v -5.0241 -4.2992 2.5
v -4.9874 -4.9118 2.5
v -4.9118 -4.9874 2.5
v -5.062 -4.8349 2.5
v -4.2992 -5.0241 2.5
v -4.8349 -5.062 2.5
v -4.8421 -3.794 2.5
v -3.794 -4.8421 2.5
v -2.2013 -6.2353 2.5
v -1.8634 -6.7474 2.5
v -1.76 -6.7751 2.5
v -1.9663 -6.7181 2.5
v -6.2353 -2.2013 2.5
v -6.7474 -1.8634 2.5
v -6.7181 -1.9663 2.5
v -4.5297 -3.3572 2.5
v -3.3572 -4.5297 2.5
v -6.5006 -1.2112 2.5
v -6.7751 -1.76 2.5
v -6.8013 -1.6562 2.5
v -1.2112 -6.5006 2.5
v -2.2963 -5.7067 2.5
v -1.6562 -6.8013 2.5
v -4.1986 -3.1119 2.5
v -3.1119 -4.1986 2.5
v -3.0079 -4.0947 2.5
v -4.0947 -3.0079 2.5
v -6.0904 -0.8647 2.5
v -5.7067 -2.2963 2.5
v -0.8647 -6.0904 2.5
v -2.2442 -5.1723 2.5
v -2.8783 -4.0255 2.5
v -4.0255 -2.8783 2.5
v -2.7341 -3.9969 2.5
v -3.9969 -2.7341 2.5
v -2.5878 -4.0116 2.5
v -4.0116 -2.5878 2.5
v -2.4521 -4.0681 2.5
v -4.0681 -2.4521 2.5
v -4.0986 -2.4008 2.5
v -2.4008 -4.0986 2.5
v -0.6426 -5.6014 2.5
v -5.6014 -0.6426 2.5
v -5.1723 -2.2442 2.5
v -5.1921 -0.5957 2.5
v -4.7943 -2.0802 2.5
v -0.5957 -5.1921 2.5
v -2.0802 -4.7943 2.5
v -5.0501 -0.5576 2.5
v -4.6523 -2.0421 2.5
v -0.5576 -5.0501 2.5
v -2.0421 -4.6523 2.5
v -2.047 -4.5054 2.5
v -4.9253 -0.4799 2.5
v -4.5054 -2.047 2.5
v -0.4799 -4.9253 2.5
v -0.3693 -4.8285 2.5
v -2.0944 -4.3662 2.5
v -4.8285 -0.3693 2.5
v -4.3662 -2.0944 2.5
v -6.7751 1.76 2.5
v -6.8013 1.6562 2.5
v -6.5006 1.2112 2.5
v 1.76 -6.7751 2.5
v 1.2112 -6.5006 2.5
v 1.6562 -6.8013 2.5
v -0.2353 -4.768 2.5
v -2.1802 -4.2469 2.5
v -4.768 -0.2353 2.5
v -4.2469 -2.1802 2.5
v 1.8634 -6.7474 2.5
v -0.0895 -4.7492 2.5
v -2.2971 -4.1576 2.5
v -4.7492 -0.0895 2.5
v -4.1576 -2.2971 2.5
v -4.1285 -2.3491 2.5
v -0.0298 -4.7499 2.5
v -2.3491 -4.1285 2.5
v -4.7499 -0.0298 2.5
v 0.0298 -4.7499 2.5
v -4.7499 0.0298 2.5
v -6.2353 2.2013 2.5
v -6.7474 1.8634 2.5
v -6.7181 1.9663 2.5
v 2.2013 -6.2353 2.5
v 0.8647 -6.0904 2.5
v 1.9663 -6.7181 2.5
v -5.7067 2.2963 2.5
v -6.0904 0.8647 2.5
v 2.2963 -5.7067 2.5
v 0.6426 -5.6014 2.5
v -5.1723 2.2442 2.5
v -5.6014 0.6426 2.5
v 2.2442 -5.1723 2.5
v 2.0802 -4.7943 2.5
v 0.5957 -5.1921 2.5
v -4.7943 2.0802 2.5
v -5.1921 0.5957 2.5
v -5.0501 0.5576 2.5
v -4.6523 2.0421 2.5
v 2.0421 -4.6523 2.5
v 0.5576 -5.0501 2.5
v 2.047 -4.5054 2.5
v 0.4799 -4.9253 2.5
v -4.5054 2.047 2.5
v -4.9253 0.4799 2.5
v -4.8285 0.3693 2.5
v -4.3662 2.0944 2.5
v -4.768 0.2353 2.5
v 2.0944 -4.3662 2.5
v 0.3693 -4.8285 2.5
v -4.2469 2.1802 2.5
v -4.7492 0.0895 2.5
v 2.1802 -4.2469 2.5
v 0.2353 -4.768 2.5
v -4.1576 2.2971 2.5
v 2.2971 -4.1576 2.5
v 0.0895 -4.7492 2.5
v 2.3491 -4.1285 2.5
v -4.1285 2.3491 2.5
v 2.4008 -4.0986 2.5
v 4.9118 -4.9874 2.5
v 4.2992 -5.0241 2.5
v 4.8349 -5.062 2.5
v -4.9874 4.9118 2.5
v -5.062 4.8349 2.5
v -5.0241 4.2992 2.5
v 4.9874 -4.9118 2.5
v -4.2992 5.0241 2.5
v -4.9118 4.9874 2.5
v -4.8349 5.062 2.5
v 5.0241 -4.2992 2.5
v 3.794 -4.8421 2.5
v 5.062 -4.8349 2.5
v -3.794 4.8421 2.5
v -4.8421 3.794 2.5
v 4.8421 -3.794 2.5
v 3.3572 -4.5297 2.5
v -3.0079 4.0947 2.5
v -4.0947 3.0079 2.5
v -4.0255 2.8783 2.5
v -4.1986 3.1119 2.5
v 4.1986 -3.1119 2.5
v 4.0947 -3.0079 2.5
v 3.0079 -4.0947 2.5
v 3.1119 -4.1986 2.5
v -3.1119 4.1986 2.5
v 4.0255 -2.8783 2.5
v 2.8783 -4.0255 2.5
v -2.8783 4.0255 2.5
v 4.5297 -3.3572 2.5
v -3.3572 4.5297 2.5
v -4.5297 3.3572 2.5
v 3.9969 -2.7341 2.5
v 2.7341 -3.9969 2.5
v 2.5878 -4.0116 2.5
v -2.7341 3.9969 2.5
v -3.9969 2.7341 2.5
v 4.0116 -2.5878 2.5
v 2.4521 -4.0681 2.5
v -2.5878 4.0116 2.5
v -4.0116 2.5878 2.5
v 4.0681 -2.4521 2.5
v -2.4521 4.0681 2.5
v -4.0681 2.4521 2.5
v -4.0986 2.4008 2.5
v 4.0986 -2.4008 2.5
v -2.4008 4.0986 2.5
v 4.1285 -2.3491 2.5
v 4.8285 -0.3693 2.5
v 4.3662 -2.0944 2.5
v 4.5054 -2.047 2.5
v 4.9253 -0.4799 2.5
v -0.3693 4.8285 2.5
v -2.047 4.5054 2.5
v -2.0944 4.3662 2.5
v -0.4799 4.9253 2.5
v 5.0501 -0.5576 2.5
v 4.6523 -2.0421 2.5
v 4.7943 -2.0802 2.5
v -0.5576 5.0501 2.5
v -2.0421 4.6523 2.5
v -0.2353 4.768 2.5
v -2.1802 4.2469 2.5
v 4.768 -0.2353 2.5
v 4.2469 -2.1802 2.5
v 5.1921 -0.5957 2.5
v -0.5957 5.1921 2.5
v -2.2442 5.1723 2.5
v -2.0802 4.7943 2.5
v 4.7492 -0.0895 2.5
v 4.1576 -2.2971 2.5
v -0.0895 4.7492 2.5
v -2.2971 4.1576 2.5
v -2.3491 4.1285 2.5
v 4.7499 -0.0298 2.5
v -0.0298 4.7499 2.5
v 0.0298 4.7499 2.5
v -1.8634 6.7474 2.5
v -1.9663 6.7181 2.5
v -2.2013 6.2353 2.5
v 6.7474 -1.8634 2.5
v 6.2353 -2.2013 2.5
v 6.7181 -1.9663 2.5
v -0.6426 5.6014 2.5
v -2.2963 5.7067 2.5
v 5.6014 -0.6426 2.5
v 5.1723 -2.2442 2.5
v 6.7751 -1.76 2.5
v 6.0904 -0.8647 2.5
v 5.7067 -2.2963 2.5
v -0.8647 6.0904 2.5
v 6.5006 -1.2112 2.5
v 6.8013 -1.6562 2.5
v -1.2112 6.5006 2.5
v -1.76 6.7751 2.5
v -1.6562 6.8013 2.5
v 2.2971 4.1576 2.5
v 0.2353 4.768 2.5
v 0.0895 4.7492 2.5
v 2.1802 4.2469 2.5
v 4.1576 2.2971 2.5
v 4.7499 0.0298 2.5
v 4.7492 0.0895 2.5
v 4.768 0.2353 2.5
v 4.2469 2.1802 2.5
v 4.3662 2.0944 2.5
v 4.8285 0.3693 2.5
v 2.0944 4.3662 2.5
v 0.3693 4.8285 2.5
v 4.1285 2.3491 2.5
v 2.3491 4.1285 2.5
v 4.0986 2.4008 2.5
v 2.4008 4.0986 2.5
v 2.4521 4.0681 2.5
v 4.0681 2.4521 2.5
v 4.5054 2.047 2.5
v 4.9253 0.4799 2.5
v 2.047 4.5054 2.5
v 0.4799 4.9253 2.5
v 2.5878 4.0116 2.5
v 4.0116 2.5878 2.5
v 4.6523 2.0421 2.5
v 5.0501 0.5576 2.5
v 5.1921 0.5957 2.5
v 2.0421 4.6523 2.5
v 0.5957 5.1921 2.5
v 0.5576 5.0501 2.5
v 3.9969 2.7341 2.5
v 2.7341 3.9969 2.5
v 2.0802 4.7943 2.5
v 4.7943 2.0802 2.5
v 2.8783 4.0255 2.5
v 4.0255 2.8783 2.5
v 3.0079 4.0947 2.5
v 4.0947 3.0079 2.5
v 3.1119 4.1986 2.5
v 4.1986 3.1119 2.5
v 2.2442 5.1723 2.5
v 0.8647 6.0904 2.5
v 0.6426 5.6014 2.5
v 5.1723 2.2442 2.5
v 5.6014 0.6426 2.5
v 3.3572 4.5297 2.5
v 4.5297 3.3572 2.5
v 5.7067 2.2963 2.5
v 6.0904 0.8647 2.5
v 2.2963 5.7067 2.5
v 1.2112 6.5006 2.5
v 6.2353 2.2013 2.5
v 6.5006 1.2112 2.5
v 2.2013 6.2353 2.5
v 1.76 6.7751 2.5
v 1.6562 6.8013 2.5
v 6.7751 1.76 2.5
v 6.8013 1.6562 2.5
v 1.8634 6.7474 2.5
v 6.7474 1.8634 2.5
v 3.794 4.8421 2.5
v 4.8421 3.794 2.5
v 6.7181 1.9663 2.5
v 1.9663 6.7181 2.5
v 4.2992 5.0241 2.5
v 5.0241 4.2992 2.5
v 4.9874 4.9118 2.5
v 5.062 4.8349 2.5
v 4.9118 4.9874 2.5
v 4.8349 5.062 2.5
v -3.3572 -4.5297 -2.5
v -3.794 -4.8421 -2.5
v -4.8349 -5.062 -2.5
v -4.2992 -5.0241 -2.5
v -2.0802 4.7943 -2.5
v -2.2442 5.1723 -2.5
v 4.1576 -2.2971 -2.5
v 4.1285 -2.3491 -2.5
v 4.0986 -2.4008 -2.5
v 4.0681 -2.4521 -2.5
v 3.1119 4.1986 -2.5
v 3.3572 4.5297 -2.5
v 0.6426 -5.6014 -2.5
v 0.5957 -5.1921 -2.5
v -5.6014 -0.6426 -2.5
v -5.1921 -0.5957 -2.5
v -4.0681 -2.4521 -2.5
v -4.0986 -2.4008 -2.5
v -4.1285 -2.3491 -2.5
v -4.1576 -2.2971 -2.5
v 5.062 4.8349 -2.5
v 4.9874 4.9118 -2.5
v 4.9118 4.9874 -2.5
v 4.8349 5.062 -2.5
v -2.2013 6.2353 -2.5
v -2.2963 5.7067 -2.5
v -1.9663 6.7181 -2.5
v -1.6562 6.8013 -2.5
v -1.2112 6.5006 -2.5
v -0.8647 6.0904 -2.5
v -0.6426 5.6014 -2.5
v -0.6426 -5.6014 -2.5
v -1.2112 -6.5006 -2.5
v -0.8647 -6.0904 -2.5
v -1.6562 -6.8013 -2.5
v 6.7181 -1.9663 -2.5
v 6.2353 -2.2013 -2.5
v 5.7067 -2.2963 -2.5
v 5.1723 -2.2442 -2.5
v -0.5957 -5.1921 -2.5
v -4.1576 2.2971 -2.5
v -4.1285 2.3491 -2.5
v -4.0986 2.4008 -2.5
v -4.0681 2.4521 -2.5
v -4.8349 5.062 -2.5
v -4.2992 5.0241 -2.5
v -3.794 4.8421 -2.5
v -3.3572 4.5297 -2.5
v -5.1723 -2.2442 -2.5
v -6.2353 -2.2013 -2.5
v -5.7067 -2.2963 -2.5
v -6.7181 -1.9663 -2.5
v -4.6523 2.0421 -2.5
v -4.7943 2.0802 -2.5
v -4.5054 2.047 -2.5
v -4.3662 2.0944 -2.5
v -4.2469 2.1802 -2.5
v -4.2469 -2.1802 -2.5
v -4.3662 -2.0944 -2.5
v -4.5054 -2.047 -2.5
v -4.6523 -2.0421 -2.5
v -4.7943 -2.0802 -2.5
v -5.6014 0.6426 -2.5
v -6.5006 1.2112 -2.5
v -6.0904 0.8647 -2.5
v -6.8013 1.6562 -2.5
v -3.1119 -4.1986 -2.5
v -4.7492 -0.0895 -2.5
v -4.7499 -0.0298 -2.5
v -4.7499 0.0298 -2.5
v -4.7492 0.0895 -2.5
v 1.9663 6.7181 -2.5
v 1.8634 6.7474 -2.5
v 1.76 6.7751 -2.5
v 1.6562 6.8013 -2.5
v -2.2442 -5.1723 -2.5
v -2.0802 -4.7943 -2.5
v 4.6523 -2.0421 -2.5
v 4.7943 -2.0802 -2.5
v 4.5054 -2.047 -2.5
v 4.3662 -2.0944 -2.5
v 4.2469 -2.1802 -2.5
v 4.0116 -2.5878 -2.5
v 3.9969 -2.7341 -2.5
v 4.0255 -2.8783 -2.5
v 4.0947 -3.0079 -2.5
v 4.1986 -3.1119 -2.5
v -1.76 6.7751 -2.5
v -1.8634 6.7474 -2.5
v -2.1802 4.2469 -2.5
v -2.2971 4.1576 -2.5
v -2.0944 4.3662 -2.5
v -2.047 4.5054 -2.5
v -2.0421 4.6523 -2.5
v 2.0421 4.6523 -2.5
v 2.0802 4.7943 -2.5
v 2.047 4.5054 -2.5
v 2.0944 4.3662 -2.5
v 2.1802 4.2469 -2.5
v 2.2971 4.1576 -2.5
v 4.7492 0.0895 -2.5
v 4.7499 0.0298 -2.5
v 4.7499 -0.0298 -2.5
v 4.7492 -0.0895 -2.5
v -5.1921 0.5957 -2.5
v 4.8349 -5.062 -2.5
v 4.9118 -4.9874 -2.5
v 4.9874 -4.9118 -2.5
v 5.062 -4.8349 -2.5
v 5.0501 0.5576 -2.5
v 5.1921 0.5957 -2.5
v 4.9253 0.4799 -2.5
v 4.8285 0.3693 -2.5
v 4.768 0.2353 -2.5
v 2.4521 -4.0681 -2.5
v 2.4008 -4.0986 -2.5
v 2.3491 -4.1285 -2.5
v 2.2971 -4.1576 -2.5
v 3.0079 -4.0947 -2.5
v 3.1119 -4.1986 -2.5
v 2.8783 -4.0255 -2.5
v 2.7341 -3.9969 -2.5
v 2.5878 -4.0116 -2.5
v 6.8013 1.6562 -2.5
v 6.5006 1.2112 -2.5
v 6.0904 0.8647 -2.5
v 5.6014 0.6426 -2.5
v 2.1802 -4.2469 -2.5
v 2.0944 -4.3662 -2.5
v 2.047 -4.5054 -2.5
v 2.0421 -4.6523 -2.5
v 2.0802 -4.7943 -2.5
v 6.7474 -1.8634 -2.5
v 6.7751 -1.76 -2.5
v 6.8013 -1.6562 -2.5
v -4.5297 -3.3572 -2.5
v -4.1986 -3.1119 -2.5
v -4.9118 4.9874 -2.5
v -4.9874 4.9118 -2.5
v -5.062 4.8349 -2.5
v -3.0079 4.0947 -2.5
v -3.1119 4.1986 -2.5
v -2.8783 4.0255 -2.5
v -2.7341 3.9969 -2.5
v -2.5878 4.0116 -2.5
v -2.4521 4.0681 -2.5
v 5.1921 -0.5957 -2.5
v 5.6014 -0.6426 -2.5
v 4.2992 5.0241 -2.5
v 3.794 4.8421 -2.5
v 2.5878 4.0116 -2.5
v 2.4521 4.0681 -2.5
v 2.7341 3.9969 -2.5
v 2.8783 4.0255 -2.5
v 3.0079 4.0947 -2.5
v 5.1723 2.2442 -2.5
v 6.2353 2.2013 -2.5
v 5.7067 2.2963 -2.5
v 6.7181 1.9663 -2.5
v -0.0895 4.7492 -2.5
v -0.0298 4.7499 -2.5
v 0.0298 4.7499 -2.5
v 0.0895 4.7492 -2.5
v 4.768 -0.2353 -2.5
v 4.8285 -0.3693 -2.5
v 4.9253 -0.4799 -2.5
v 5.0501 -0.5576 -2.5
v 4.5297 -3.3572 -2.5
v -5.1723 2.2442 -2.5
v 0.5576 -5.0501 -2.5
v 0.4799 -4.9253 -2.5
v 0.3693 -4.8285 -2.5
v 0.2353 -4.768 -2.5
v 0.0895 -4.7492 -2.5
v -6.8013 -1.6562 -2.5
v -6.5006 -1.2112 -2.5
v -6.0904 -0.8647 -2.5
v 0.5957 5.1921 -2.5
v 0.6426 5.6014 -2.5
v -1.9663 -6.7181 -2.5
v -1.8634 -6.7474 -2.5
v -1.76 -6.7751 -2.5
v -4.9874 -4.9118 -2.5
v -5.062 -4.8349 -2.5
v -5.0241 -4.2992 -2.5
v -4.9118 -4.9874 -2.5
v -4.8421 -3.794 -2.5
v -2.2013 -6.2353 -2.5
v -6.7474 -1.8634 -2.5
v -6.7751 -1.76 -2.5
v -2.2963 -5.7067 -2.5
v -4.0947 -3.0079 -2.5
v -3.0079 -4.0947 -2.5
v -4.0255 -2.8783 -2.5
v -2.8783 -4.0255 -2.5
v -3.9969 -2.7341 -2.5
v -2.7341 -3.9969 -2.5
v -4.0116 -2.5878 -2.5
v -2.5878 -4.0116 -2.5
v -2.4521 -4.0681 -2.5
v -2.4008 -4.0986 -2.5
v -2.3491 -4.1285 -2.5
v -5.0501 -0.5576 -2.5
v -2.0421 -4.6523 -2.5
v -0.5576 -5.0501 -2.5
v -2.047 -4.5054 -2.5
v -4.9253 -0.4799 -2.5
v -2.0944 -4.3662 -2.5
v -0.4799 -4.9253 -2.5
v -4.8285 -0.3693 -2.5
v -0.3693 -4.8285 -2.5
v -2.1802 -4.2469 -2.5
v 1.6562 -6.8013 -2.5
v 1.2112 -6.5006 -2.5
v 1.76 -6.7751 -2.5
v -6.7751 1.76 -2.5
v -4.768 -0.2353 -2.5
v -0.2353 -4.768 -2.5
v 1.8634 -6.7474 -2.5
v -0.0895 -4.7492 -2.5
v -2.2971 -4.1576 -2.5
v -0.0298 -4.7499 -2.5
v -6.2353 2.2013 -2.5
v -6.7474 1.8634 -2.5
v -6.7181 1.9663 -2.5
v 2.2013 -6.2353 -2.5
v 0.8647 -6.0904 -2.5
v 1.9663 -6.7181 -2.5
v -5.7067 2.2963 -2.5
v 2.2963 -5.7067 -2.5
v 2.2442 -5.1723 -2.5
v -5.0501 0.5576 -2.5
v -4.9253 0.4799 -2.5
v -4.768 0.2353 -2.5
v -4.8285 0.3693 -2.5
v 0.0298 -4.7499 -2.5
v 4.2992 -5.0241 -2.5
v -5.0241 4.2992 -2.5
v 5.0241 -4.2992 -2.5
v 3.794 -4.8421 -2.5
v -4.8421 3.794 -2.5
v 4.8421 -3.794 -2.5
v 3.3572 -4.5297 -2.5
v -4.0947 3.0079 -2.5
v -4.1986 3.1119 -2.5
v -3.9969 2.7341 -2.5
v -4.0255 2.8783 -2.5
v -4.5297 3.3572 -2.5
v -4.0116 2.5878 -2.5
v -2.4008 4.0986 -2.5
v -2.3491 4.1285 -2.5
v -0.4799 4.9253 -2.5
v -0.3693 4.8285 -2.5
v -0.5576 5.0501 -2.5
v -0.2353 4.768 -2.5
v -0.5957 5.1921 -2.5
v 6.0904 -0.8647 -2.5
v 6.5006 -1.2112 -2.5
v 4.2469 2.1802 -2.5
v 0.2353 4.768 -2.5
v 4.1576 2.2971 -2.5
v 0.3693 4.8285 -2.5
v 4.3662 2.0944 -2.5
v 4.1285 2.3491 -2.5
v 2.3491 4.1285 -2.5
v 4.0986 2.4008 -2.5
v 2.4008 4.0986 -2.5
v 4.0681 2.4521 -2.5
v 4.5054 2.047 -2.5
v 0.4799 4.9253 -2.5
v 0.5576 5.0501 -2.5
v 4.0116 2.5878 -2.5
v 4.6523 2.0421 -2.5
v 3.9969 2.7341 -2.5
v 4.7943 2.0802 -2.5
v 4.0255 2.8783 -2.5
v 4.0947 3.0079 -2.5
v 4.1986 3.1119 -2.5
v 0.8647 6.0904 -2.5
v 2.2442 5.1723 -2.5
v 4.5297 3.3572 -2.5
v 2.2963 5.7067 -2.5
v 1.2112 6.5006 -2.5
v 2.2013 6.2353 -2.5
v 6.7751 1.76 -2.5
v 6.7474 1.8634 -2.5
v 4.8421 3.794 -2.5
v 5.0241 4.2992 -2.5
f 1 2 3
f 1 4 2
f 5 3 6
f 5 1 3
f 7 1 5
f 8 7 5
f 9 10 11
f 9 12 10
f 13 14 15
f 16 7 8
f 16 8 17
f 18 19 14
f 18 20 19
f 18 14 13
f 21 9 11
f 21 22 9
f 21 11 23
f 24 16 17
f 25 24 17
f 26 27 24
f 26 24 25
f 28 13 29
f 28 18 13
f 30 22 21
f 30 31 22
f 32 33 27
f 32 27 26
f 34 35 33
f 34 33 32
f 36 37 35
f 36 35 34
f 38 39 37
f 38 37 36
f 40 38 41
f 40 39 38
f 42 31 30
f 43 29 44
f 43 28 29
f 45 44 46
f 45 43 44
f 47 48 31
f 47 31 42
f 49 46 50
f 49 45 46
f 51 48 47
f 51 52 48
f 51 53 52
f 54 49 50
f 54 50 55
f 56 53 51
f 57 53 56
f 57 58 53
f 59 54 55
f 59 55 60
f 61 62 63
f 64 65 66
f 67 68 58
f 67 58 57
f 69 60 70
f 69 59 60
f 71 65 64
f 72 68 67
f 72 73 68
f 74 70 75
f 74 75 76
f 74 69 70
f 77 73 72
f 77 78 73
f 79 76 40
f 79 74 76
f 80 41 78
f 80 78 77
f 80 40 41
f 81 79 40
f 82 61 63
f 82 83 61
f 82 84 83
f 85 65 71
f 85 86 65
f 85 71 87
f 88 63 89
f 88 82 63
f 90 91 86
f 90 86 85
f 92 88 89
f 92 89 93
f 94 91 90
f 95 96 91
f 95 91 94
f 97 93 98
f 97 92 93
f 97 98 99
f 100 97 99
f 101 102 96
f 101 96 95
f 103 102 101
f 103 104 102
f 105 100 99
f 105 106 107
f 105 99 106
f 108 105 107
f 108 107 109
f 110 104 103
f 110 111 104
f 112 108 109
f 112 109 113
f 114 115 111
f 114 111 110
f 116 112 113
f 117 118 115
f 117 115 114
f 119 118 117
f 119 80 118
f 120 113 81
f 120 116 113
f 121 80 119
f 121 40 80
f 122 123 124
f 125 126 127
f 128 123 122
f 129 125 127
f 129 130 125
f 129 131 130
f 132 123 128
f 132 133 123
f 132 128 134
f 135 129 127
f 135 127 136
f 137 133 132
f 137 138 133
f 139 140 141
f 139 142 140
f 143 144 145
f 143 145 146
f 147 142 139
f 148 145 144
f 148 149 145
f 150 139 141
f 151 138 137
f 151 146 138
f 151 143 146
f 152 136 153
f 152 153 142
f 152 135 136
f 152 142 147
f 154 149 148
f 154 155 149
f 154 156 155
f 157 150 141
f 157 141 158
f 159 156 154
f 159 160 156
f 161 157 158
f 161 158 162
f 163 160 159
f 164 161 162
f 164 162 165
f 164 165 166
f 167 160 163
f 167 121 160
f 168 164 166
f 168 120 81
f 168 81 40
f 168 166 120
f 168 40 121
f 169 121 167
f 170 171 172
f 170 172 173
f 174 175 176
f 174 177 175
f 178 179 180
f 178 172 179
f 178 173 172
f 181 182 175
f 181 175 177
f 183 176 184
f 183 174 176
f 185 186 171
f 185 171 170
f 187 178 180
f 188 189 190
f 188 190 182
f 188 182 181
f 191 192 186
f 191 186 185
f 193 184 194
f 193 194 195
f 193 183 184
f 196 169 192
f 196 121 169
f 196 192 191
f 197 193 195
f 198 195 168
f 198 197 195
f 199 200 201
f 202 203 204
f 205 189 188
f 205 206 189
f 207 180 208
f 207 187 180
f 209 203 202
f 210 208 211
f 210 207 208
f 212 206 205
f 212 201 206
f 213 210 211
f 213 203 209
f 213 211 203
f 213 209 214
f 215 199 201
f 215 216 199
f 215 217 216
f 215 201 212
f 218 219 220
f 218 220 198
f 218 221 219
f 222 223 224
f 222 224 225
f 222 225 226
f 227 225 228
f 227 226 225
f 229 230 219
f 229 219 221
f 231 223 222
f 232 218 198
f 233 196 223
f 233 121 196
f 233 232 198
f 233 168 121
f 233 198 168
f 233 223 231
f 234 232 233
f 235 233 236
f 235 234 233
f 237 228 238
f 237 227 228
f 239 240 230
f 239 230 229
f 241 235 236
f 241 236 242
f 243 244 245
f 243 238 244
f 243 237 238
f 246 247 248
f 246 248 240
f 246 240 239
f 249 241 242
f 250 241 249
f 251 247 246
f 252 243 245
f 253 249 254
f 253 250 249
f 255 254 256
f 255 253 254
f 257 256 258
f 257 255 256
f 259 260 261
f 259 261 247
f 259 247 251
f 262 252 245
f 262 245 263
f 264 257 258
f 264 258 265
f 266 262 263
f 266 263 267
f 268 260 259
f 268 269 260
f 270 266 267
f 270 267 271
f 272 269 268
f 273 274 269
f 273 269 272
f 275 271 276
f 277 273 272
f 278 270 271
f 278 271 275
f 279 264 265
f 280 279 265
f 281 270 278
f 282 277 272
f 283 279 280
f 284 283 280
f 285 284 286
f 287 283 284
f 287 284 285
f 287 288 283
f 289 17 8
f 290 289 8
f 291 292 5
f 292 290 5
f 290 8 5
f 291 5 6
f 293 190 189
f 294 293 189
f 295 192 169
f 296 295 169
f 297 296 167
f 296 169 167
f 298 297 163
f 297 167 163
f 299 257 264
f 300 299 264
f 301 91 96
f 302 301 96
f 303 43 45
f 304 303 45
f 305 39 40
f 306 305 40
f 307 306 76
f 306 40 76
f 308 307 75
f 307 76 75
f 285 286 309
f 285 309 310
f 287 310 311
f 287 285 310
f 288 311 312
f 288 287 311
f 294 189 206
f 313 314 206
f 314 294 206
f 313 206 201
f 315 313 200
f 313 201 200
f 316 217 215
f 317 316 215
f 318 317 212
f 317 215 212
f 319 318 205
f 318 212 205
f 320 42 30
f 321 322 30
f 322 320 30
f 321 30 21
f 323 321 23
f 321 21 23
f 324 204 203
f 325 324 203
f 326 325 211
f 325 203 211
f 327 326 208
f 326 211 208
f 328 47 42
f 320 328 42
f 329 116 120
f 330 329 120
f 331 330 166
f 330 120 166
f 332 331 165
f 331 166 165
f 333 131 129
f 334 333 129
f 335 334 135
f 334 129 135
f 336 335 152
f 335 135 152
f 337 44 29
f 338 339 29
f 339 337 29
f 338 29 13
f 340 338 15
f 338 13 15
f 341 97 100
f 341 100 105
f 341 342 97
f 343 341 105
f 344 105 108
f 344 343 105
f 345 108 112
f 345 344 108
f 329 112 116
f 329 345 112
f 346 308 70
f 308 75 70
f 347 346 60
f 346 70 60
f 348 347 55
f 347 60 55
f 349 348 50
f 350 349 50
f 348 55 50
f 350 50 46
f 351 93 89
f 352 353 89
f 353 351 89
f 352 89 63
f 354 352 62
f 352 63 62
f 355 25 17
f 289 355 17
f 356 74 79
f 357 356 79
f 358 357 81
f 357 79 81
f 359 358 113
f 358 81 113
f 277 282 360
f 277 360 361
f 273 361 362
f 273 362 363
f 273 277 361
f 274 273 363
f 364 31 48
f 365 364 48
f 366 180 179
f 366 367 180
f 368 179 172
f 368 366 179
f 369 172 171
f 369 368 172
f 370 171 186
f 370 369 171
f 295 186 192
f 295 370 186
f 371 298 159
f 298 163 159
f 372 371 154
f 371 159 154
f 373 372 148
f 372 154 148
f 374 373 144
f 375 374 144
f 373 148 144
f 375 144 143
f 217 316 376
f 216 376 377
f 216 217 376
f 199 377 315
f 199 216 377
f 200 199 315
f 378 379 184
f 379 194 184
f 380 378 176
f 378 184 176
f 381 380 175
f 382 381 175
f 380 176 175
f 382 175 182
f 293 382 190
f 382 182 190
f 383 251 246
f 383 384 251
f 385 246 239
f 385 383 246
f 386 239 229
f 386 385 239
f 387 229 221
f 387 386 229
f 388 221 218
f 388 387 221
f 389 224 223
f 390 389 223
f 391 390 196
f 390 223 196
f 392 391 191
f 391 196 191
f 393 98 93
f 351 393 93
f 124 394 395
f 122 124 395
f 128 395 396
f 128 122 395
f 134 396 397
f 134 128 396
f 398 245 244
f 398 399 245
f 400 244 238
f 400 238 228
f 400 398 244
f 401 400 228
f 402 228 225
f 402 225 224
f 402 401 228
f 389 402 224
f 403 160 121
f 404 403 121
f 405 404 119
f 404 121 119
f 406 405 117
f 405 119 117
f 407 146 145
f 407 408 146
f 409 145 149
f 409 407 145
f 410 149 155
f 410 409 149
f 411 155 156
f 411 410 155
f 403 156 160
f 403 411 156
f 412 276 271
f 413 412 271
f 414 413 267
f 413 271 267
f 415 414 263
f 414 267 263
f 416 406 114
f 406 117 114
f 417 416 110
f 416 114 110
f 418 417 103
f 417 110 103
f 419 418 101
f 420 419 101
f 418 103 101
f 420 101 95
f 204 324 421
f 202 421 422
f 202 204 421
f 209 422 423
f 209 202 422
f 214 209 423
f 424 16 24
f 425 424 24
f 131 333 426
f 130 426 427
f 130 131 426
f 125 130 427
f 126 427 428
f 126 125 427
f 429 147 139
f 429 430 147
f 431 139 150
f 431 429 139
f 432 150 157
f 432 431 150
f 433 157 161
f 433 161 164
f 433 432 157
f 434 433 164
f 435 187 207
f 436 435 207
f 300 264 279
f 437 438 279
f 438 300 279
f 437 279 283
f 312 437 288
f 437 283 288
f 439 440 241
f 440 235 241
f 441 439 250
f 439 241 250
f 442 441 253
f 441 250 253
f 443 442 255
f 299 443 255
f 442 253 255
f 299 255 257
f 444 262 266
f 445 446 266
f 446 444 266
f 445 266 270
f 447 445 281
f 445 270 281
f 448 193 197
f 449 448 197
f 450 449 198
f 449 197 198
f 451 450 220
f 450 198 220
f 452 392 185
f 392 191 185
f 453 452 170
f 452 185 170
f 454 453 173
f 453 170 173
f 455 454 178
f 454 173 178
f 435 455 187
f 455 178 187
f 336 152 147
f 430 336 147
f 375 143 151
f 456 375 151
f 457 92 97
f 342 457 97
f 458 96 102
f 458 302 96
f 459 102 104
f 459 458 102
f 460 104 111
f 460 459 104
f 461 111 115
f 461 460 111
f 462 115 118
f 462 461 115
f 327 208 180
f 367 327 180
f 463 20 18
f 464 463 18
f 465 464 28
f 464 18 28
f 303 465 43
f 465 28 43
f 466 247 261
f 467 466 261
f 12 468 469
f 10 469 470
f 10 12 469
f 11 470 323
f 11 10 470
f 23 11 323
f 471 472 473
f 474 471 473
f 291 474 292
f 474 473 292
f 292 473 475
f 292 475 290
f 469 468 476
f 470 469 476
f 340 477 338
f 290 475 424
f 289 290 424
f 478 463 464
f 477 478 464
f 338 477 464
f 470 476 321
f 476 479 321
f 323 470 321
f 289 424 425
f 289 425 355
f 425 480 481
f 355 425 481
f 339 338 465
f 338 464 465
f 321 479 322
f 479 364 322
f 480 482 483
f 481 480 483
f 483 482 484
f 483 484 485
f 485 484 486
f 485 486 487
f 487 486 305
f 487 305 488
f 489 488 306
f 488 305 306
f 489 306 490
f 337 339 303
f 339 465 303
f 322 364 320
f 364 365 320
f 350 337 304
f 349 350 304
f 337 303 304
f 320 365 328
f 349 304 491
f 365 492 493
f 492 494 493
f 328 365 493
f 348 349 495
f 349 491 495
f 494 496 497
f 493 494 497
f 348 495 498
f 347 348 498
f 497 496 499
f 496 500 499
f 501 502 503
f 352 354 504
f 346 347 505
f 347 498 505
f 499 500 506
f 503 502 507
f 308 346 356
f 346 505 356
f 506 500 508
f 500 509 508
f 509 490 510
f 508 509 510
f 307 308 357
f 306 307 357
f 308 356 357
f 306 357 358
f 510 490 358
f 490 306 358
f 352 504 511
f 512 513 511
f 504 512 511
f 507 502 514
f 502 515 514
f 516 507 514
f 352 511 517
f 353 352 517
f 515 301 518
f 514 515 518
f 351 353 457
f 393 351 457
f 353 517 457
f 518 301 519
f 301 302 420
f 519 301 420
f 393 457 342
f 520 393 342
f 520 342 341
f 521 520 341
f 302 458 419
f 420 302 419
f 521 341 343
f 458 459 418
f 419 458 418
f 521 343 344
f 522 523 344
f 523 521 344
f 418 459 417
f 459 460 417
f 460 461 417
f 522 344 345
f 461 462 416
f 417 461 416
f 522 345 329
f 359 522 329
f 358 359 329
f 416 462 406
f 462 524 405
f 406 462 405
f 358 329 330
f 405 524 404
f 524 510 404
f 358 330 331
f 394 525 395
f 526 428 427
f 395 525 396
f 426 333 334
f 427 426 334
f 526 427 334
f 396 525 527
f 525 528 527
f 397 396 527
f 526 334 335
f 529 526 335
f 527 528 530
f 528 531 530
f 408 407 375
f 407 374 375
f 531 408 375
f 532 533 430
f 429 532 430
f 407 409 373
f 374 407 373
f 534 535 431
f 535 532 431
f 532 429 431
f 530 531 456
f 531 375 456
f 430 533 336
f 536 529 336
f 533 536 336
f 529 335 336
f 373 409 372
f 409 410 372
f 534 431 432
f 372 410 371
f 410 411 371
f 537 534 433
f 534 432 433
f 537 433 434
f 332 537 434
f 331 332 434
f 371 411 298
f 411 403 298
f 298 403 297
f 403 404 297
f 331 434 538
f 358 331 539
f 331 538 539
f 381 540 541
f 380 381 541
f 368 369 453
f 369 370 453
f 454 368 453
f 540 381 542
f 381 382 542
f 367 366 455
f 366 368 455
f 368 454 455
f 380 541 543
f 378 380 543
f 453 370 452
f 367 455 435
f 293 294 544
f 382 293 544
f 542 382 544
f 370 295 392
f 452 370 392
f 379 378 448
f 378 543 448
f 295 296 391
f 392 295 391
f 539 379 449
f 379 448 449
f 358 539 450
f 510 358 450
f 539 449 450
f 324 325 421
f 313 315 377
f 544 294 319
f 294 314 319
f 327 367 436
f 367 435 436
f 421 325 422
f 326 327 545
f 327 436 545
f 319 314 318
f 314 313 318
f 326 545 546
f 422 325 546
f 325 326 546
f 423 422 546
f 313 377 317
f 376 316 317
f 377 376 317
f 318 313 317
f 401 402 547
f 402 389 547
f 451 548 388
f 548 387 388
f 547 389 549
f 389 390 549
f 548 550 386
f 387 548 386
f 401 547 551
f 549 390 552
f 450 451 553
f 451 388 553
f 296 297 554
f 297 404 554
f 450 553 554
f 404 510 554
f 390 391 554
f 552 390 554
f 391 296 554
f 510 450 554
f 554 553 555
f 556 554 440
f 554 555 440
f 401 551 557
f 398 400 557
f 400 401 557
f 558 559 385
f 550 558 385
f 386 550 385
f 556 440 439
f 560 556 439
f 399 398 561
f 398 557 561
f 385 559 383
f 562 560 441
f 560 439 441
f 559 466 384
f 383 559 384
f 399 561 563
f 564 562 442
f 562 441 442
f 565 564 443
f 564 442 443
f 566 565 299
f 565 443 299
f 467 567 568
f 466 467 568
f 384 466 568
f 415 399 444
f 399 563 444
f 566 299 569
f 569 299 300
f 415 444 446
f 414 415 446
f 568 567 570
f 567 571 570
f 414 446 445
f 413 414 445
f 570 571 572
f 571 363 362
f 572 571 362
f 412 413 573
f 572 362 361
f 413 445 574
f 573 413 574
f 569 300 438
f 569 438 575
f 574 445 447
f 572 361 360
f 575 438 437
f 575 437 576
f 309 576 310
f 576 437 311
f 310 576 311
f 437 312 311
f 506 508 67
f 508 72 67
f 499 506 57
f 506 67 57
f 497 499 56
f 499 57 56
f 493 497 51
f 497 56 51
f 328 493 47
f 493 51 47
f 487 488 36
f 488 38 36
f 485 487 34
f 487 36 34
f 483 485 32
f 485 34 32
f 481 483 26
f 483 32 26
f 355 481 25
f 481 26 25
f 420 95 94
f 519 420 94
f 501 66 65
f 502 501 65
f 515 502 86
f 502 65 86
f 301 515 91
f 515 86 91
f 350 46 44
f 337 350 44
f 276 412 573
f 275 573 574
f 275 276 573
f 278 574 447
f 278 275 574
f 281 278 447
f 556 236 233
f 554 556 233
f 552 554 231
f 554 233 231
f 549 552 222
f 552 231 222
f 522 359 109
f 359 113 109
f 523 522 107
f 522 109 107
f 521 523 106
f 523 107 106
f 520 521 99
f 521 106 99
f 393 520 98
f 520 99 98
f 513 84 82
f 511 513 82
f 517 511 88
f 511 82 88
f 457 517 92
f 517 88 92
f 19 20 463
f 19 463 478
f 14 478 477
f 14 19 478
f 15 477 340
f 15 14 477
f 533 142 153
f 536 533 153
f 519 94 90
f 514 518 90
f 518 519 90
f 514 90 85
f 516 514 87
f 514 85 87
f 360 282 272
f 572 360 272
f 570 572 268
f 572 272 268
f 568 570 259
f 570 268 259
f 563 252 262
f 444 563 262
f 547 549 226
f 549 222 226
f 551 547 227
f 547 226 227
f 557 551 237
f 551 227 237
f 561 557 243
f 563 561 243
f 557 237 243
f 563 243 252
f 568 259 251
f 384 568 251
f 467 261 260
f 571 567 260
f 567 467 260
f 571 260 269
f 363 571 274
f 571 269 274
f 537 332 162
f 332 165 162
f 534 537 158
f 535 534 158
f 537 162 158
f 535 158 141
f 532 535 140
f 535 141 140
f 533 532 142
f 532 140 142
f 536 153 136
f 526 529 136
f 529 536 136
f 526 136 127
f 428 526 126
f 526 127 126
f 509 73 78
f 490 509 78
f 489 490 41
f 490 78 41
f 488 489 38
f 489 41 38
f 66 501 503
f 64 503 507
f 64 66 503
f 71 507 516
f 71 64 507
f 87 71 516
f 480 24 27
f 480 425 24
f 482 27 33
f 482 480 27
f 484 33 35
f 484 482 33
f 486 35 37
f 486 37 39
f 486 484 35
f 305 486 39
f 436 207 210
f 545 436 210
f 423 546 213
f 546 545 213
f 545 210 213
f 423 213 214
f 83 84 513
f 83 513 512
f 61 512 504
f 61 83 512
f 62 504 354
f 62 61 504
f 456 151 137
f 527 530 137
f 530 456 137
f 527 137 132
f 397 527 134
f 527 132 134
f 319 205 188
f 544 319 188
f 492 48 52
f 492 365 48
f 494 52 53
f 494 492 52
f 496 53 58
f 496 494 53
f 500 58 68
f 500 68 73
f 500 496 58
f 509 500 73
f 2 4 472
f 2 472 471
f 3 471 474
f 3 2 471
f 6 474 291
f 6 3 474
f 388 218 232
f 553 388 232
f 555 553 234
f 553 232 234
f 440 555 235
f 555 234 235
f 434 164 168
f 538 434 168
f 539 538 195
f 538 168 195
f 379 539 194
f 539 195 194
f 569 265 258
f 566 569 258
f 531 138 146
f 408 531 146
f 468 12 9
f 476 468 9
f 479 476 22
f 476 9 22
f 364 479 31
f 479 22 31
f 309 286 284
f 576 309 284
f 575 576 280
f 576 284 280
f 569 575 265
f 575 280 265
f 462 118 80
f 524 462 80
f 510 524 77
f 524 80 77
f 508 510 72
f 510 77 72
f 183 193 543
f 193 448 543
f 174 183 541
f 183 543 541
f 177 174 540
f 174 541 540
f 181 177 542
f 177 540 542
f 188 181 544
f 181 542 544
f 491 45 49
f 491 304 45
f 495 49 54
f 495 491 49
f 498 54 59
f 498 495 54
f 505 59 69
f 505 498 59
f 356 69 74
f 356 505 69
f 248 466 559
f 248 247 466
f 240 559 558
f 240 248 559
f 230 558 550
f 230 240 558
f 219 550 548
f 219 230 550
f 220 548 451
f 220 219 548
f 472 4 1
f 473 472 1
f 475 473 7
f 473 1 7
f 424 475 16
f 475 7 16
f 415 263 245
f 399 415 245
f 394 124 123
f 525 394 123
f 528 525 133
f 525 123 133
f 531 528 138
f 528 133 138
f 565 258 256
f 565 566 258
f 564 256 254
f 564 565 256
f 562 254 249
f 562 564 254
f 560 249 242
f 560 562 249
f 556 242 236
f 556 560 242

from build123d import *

# Parameters (mm, degrees)
SKETCH1_R                                = 7
DA_CIRCLE_DEPTH                          = 2.5
ONE_TEETH_DEPTH                          = 11.210288928
FILLET_FOR_HIGH_R                        = 0.5
CIRPATTERN_FOR_HIGH_COUNT                = 12
FILLET_FOR_HIGH_OF_CIRPATTERN_FOR_HIGH_R = 0.5


with BuildPart() as part:
    # Sketch1 → Da_circle (new, symmetric)
    with BuildSketch(Plane.XY):
        Circle(SKETCH1_R)
    extrude(amount=DA_CIRCLE_DEPTH, both=True)

    # Sketch → one_teeth (cut, symmetric)
    with BuildSketch(Plane.XY):
        with BuildLine():
            ThreePointArc((-0.54138974, 4.719046212), (0, 4.75), (0.54138974, 4.719046212))
            Line((0.54138974, 4.719046212), (0.642618876, 5.601414192))
            ThreePointArc((0.642618876, 5.601414192), (0.704564548, 5.778410288), (0.783157153, 5.948669168))
            ThreePointArc((0.783157153, 5.948669168), (1.15155426, 6.444705558), (1.656172795, 6.801256625))
            ThreePointArc((1.656172795, 6.801256625), (0, 7), (-1.656172795, 6.801256625))
            ThreePointArc((-1.656172795, 6.801256625), (-1.02382272, 6.30741194), (-0.642618876, 5.601414192))
            Line((-0.642618876, 5.601414192), (-0.54138974, 4.719046212))
        make_face()
    one_teeth = extrude(amount=ONE_TEETH_DEPTH, both=True, mode=Mode.SUBTRACT)

    # Fillet_for_high
    fillet_for_high_edges = [part.edges().sort_by_distance(p)[0] for p in [
        (-0.54138974, 4.719046212, 0),
        (0.54138974, 4.719046212, 0),
    ]]
    fillet(fillet_for_high_edges, radius=FILLET_FOR_HIGH_R)

    # CirPattern_for_high: one_teeth ×12 about axis
    cirpattern_for_high_axis = Axis((0, 0, 2.5), (0, 0, -1))
    for i in range(1, CIRPATTERN_FOR_HIGH_COUNT):
        add(one_teeth.rotate(cirpattern_for_high_axis, i * 360 / CIRPATTERN_FOR_HIGH_COUNT), mode=Mode.SUBTRACT)

    # Fillet_for_high of CirPattern_for_high
    fillet_for_high_of_cirpattern_for_high_edges = [part.edges().sort_by_distance(p)[0] for p in [
        (1.890665838, 4.357508771, 0),
        (2.828380374, 3.816119031, 0),
        (3.816119031, 2.828380374, 0),
        (4.357508771, 1.890665838, 0),
        (4.719046212, 0.54138974, 0),
        (4.719046212, -0.54138974, 0),
        (4.357508771, -1.890665838, 0),
        (3.816119031, -2.828380374, 0),
        (2.828380374, -3.816119031, 0),
        (1.890665838, -4.357508771, 0),
        (0.54138974, -4.719046212, 0),
        (-0.54138974, -4.719046212, 0),
        (-1.890665838, -4.357508771, 0),
        (-2.828380374, -3.816119031, 0),
        (-3.816119031, -2.828380374, 0),
        (-4.357508771, -1.890665838, 0),
        (-4.719046212, -0.54138974, 0),
        (-4.719046212, 0.54138974, 0),
        (-4.357508771, 1.890665838, 0),
        (-3.816119031, 2.828380374, 0),
        (-2.828380374, 3.816119031, 0),
        (-1.890665838, 4.357508771, 0),
    ]]
    fillet(fillet_for_high_of_cirpattern_for_high_edges, radius=FILLET_FOR_HIGH_OF_CIRPATTERN_FOR_HIGH_R)


solid = part.part
